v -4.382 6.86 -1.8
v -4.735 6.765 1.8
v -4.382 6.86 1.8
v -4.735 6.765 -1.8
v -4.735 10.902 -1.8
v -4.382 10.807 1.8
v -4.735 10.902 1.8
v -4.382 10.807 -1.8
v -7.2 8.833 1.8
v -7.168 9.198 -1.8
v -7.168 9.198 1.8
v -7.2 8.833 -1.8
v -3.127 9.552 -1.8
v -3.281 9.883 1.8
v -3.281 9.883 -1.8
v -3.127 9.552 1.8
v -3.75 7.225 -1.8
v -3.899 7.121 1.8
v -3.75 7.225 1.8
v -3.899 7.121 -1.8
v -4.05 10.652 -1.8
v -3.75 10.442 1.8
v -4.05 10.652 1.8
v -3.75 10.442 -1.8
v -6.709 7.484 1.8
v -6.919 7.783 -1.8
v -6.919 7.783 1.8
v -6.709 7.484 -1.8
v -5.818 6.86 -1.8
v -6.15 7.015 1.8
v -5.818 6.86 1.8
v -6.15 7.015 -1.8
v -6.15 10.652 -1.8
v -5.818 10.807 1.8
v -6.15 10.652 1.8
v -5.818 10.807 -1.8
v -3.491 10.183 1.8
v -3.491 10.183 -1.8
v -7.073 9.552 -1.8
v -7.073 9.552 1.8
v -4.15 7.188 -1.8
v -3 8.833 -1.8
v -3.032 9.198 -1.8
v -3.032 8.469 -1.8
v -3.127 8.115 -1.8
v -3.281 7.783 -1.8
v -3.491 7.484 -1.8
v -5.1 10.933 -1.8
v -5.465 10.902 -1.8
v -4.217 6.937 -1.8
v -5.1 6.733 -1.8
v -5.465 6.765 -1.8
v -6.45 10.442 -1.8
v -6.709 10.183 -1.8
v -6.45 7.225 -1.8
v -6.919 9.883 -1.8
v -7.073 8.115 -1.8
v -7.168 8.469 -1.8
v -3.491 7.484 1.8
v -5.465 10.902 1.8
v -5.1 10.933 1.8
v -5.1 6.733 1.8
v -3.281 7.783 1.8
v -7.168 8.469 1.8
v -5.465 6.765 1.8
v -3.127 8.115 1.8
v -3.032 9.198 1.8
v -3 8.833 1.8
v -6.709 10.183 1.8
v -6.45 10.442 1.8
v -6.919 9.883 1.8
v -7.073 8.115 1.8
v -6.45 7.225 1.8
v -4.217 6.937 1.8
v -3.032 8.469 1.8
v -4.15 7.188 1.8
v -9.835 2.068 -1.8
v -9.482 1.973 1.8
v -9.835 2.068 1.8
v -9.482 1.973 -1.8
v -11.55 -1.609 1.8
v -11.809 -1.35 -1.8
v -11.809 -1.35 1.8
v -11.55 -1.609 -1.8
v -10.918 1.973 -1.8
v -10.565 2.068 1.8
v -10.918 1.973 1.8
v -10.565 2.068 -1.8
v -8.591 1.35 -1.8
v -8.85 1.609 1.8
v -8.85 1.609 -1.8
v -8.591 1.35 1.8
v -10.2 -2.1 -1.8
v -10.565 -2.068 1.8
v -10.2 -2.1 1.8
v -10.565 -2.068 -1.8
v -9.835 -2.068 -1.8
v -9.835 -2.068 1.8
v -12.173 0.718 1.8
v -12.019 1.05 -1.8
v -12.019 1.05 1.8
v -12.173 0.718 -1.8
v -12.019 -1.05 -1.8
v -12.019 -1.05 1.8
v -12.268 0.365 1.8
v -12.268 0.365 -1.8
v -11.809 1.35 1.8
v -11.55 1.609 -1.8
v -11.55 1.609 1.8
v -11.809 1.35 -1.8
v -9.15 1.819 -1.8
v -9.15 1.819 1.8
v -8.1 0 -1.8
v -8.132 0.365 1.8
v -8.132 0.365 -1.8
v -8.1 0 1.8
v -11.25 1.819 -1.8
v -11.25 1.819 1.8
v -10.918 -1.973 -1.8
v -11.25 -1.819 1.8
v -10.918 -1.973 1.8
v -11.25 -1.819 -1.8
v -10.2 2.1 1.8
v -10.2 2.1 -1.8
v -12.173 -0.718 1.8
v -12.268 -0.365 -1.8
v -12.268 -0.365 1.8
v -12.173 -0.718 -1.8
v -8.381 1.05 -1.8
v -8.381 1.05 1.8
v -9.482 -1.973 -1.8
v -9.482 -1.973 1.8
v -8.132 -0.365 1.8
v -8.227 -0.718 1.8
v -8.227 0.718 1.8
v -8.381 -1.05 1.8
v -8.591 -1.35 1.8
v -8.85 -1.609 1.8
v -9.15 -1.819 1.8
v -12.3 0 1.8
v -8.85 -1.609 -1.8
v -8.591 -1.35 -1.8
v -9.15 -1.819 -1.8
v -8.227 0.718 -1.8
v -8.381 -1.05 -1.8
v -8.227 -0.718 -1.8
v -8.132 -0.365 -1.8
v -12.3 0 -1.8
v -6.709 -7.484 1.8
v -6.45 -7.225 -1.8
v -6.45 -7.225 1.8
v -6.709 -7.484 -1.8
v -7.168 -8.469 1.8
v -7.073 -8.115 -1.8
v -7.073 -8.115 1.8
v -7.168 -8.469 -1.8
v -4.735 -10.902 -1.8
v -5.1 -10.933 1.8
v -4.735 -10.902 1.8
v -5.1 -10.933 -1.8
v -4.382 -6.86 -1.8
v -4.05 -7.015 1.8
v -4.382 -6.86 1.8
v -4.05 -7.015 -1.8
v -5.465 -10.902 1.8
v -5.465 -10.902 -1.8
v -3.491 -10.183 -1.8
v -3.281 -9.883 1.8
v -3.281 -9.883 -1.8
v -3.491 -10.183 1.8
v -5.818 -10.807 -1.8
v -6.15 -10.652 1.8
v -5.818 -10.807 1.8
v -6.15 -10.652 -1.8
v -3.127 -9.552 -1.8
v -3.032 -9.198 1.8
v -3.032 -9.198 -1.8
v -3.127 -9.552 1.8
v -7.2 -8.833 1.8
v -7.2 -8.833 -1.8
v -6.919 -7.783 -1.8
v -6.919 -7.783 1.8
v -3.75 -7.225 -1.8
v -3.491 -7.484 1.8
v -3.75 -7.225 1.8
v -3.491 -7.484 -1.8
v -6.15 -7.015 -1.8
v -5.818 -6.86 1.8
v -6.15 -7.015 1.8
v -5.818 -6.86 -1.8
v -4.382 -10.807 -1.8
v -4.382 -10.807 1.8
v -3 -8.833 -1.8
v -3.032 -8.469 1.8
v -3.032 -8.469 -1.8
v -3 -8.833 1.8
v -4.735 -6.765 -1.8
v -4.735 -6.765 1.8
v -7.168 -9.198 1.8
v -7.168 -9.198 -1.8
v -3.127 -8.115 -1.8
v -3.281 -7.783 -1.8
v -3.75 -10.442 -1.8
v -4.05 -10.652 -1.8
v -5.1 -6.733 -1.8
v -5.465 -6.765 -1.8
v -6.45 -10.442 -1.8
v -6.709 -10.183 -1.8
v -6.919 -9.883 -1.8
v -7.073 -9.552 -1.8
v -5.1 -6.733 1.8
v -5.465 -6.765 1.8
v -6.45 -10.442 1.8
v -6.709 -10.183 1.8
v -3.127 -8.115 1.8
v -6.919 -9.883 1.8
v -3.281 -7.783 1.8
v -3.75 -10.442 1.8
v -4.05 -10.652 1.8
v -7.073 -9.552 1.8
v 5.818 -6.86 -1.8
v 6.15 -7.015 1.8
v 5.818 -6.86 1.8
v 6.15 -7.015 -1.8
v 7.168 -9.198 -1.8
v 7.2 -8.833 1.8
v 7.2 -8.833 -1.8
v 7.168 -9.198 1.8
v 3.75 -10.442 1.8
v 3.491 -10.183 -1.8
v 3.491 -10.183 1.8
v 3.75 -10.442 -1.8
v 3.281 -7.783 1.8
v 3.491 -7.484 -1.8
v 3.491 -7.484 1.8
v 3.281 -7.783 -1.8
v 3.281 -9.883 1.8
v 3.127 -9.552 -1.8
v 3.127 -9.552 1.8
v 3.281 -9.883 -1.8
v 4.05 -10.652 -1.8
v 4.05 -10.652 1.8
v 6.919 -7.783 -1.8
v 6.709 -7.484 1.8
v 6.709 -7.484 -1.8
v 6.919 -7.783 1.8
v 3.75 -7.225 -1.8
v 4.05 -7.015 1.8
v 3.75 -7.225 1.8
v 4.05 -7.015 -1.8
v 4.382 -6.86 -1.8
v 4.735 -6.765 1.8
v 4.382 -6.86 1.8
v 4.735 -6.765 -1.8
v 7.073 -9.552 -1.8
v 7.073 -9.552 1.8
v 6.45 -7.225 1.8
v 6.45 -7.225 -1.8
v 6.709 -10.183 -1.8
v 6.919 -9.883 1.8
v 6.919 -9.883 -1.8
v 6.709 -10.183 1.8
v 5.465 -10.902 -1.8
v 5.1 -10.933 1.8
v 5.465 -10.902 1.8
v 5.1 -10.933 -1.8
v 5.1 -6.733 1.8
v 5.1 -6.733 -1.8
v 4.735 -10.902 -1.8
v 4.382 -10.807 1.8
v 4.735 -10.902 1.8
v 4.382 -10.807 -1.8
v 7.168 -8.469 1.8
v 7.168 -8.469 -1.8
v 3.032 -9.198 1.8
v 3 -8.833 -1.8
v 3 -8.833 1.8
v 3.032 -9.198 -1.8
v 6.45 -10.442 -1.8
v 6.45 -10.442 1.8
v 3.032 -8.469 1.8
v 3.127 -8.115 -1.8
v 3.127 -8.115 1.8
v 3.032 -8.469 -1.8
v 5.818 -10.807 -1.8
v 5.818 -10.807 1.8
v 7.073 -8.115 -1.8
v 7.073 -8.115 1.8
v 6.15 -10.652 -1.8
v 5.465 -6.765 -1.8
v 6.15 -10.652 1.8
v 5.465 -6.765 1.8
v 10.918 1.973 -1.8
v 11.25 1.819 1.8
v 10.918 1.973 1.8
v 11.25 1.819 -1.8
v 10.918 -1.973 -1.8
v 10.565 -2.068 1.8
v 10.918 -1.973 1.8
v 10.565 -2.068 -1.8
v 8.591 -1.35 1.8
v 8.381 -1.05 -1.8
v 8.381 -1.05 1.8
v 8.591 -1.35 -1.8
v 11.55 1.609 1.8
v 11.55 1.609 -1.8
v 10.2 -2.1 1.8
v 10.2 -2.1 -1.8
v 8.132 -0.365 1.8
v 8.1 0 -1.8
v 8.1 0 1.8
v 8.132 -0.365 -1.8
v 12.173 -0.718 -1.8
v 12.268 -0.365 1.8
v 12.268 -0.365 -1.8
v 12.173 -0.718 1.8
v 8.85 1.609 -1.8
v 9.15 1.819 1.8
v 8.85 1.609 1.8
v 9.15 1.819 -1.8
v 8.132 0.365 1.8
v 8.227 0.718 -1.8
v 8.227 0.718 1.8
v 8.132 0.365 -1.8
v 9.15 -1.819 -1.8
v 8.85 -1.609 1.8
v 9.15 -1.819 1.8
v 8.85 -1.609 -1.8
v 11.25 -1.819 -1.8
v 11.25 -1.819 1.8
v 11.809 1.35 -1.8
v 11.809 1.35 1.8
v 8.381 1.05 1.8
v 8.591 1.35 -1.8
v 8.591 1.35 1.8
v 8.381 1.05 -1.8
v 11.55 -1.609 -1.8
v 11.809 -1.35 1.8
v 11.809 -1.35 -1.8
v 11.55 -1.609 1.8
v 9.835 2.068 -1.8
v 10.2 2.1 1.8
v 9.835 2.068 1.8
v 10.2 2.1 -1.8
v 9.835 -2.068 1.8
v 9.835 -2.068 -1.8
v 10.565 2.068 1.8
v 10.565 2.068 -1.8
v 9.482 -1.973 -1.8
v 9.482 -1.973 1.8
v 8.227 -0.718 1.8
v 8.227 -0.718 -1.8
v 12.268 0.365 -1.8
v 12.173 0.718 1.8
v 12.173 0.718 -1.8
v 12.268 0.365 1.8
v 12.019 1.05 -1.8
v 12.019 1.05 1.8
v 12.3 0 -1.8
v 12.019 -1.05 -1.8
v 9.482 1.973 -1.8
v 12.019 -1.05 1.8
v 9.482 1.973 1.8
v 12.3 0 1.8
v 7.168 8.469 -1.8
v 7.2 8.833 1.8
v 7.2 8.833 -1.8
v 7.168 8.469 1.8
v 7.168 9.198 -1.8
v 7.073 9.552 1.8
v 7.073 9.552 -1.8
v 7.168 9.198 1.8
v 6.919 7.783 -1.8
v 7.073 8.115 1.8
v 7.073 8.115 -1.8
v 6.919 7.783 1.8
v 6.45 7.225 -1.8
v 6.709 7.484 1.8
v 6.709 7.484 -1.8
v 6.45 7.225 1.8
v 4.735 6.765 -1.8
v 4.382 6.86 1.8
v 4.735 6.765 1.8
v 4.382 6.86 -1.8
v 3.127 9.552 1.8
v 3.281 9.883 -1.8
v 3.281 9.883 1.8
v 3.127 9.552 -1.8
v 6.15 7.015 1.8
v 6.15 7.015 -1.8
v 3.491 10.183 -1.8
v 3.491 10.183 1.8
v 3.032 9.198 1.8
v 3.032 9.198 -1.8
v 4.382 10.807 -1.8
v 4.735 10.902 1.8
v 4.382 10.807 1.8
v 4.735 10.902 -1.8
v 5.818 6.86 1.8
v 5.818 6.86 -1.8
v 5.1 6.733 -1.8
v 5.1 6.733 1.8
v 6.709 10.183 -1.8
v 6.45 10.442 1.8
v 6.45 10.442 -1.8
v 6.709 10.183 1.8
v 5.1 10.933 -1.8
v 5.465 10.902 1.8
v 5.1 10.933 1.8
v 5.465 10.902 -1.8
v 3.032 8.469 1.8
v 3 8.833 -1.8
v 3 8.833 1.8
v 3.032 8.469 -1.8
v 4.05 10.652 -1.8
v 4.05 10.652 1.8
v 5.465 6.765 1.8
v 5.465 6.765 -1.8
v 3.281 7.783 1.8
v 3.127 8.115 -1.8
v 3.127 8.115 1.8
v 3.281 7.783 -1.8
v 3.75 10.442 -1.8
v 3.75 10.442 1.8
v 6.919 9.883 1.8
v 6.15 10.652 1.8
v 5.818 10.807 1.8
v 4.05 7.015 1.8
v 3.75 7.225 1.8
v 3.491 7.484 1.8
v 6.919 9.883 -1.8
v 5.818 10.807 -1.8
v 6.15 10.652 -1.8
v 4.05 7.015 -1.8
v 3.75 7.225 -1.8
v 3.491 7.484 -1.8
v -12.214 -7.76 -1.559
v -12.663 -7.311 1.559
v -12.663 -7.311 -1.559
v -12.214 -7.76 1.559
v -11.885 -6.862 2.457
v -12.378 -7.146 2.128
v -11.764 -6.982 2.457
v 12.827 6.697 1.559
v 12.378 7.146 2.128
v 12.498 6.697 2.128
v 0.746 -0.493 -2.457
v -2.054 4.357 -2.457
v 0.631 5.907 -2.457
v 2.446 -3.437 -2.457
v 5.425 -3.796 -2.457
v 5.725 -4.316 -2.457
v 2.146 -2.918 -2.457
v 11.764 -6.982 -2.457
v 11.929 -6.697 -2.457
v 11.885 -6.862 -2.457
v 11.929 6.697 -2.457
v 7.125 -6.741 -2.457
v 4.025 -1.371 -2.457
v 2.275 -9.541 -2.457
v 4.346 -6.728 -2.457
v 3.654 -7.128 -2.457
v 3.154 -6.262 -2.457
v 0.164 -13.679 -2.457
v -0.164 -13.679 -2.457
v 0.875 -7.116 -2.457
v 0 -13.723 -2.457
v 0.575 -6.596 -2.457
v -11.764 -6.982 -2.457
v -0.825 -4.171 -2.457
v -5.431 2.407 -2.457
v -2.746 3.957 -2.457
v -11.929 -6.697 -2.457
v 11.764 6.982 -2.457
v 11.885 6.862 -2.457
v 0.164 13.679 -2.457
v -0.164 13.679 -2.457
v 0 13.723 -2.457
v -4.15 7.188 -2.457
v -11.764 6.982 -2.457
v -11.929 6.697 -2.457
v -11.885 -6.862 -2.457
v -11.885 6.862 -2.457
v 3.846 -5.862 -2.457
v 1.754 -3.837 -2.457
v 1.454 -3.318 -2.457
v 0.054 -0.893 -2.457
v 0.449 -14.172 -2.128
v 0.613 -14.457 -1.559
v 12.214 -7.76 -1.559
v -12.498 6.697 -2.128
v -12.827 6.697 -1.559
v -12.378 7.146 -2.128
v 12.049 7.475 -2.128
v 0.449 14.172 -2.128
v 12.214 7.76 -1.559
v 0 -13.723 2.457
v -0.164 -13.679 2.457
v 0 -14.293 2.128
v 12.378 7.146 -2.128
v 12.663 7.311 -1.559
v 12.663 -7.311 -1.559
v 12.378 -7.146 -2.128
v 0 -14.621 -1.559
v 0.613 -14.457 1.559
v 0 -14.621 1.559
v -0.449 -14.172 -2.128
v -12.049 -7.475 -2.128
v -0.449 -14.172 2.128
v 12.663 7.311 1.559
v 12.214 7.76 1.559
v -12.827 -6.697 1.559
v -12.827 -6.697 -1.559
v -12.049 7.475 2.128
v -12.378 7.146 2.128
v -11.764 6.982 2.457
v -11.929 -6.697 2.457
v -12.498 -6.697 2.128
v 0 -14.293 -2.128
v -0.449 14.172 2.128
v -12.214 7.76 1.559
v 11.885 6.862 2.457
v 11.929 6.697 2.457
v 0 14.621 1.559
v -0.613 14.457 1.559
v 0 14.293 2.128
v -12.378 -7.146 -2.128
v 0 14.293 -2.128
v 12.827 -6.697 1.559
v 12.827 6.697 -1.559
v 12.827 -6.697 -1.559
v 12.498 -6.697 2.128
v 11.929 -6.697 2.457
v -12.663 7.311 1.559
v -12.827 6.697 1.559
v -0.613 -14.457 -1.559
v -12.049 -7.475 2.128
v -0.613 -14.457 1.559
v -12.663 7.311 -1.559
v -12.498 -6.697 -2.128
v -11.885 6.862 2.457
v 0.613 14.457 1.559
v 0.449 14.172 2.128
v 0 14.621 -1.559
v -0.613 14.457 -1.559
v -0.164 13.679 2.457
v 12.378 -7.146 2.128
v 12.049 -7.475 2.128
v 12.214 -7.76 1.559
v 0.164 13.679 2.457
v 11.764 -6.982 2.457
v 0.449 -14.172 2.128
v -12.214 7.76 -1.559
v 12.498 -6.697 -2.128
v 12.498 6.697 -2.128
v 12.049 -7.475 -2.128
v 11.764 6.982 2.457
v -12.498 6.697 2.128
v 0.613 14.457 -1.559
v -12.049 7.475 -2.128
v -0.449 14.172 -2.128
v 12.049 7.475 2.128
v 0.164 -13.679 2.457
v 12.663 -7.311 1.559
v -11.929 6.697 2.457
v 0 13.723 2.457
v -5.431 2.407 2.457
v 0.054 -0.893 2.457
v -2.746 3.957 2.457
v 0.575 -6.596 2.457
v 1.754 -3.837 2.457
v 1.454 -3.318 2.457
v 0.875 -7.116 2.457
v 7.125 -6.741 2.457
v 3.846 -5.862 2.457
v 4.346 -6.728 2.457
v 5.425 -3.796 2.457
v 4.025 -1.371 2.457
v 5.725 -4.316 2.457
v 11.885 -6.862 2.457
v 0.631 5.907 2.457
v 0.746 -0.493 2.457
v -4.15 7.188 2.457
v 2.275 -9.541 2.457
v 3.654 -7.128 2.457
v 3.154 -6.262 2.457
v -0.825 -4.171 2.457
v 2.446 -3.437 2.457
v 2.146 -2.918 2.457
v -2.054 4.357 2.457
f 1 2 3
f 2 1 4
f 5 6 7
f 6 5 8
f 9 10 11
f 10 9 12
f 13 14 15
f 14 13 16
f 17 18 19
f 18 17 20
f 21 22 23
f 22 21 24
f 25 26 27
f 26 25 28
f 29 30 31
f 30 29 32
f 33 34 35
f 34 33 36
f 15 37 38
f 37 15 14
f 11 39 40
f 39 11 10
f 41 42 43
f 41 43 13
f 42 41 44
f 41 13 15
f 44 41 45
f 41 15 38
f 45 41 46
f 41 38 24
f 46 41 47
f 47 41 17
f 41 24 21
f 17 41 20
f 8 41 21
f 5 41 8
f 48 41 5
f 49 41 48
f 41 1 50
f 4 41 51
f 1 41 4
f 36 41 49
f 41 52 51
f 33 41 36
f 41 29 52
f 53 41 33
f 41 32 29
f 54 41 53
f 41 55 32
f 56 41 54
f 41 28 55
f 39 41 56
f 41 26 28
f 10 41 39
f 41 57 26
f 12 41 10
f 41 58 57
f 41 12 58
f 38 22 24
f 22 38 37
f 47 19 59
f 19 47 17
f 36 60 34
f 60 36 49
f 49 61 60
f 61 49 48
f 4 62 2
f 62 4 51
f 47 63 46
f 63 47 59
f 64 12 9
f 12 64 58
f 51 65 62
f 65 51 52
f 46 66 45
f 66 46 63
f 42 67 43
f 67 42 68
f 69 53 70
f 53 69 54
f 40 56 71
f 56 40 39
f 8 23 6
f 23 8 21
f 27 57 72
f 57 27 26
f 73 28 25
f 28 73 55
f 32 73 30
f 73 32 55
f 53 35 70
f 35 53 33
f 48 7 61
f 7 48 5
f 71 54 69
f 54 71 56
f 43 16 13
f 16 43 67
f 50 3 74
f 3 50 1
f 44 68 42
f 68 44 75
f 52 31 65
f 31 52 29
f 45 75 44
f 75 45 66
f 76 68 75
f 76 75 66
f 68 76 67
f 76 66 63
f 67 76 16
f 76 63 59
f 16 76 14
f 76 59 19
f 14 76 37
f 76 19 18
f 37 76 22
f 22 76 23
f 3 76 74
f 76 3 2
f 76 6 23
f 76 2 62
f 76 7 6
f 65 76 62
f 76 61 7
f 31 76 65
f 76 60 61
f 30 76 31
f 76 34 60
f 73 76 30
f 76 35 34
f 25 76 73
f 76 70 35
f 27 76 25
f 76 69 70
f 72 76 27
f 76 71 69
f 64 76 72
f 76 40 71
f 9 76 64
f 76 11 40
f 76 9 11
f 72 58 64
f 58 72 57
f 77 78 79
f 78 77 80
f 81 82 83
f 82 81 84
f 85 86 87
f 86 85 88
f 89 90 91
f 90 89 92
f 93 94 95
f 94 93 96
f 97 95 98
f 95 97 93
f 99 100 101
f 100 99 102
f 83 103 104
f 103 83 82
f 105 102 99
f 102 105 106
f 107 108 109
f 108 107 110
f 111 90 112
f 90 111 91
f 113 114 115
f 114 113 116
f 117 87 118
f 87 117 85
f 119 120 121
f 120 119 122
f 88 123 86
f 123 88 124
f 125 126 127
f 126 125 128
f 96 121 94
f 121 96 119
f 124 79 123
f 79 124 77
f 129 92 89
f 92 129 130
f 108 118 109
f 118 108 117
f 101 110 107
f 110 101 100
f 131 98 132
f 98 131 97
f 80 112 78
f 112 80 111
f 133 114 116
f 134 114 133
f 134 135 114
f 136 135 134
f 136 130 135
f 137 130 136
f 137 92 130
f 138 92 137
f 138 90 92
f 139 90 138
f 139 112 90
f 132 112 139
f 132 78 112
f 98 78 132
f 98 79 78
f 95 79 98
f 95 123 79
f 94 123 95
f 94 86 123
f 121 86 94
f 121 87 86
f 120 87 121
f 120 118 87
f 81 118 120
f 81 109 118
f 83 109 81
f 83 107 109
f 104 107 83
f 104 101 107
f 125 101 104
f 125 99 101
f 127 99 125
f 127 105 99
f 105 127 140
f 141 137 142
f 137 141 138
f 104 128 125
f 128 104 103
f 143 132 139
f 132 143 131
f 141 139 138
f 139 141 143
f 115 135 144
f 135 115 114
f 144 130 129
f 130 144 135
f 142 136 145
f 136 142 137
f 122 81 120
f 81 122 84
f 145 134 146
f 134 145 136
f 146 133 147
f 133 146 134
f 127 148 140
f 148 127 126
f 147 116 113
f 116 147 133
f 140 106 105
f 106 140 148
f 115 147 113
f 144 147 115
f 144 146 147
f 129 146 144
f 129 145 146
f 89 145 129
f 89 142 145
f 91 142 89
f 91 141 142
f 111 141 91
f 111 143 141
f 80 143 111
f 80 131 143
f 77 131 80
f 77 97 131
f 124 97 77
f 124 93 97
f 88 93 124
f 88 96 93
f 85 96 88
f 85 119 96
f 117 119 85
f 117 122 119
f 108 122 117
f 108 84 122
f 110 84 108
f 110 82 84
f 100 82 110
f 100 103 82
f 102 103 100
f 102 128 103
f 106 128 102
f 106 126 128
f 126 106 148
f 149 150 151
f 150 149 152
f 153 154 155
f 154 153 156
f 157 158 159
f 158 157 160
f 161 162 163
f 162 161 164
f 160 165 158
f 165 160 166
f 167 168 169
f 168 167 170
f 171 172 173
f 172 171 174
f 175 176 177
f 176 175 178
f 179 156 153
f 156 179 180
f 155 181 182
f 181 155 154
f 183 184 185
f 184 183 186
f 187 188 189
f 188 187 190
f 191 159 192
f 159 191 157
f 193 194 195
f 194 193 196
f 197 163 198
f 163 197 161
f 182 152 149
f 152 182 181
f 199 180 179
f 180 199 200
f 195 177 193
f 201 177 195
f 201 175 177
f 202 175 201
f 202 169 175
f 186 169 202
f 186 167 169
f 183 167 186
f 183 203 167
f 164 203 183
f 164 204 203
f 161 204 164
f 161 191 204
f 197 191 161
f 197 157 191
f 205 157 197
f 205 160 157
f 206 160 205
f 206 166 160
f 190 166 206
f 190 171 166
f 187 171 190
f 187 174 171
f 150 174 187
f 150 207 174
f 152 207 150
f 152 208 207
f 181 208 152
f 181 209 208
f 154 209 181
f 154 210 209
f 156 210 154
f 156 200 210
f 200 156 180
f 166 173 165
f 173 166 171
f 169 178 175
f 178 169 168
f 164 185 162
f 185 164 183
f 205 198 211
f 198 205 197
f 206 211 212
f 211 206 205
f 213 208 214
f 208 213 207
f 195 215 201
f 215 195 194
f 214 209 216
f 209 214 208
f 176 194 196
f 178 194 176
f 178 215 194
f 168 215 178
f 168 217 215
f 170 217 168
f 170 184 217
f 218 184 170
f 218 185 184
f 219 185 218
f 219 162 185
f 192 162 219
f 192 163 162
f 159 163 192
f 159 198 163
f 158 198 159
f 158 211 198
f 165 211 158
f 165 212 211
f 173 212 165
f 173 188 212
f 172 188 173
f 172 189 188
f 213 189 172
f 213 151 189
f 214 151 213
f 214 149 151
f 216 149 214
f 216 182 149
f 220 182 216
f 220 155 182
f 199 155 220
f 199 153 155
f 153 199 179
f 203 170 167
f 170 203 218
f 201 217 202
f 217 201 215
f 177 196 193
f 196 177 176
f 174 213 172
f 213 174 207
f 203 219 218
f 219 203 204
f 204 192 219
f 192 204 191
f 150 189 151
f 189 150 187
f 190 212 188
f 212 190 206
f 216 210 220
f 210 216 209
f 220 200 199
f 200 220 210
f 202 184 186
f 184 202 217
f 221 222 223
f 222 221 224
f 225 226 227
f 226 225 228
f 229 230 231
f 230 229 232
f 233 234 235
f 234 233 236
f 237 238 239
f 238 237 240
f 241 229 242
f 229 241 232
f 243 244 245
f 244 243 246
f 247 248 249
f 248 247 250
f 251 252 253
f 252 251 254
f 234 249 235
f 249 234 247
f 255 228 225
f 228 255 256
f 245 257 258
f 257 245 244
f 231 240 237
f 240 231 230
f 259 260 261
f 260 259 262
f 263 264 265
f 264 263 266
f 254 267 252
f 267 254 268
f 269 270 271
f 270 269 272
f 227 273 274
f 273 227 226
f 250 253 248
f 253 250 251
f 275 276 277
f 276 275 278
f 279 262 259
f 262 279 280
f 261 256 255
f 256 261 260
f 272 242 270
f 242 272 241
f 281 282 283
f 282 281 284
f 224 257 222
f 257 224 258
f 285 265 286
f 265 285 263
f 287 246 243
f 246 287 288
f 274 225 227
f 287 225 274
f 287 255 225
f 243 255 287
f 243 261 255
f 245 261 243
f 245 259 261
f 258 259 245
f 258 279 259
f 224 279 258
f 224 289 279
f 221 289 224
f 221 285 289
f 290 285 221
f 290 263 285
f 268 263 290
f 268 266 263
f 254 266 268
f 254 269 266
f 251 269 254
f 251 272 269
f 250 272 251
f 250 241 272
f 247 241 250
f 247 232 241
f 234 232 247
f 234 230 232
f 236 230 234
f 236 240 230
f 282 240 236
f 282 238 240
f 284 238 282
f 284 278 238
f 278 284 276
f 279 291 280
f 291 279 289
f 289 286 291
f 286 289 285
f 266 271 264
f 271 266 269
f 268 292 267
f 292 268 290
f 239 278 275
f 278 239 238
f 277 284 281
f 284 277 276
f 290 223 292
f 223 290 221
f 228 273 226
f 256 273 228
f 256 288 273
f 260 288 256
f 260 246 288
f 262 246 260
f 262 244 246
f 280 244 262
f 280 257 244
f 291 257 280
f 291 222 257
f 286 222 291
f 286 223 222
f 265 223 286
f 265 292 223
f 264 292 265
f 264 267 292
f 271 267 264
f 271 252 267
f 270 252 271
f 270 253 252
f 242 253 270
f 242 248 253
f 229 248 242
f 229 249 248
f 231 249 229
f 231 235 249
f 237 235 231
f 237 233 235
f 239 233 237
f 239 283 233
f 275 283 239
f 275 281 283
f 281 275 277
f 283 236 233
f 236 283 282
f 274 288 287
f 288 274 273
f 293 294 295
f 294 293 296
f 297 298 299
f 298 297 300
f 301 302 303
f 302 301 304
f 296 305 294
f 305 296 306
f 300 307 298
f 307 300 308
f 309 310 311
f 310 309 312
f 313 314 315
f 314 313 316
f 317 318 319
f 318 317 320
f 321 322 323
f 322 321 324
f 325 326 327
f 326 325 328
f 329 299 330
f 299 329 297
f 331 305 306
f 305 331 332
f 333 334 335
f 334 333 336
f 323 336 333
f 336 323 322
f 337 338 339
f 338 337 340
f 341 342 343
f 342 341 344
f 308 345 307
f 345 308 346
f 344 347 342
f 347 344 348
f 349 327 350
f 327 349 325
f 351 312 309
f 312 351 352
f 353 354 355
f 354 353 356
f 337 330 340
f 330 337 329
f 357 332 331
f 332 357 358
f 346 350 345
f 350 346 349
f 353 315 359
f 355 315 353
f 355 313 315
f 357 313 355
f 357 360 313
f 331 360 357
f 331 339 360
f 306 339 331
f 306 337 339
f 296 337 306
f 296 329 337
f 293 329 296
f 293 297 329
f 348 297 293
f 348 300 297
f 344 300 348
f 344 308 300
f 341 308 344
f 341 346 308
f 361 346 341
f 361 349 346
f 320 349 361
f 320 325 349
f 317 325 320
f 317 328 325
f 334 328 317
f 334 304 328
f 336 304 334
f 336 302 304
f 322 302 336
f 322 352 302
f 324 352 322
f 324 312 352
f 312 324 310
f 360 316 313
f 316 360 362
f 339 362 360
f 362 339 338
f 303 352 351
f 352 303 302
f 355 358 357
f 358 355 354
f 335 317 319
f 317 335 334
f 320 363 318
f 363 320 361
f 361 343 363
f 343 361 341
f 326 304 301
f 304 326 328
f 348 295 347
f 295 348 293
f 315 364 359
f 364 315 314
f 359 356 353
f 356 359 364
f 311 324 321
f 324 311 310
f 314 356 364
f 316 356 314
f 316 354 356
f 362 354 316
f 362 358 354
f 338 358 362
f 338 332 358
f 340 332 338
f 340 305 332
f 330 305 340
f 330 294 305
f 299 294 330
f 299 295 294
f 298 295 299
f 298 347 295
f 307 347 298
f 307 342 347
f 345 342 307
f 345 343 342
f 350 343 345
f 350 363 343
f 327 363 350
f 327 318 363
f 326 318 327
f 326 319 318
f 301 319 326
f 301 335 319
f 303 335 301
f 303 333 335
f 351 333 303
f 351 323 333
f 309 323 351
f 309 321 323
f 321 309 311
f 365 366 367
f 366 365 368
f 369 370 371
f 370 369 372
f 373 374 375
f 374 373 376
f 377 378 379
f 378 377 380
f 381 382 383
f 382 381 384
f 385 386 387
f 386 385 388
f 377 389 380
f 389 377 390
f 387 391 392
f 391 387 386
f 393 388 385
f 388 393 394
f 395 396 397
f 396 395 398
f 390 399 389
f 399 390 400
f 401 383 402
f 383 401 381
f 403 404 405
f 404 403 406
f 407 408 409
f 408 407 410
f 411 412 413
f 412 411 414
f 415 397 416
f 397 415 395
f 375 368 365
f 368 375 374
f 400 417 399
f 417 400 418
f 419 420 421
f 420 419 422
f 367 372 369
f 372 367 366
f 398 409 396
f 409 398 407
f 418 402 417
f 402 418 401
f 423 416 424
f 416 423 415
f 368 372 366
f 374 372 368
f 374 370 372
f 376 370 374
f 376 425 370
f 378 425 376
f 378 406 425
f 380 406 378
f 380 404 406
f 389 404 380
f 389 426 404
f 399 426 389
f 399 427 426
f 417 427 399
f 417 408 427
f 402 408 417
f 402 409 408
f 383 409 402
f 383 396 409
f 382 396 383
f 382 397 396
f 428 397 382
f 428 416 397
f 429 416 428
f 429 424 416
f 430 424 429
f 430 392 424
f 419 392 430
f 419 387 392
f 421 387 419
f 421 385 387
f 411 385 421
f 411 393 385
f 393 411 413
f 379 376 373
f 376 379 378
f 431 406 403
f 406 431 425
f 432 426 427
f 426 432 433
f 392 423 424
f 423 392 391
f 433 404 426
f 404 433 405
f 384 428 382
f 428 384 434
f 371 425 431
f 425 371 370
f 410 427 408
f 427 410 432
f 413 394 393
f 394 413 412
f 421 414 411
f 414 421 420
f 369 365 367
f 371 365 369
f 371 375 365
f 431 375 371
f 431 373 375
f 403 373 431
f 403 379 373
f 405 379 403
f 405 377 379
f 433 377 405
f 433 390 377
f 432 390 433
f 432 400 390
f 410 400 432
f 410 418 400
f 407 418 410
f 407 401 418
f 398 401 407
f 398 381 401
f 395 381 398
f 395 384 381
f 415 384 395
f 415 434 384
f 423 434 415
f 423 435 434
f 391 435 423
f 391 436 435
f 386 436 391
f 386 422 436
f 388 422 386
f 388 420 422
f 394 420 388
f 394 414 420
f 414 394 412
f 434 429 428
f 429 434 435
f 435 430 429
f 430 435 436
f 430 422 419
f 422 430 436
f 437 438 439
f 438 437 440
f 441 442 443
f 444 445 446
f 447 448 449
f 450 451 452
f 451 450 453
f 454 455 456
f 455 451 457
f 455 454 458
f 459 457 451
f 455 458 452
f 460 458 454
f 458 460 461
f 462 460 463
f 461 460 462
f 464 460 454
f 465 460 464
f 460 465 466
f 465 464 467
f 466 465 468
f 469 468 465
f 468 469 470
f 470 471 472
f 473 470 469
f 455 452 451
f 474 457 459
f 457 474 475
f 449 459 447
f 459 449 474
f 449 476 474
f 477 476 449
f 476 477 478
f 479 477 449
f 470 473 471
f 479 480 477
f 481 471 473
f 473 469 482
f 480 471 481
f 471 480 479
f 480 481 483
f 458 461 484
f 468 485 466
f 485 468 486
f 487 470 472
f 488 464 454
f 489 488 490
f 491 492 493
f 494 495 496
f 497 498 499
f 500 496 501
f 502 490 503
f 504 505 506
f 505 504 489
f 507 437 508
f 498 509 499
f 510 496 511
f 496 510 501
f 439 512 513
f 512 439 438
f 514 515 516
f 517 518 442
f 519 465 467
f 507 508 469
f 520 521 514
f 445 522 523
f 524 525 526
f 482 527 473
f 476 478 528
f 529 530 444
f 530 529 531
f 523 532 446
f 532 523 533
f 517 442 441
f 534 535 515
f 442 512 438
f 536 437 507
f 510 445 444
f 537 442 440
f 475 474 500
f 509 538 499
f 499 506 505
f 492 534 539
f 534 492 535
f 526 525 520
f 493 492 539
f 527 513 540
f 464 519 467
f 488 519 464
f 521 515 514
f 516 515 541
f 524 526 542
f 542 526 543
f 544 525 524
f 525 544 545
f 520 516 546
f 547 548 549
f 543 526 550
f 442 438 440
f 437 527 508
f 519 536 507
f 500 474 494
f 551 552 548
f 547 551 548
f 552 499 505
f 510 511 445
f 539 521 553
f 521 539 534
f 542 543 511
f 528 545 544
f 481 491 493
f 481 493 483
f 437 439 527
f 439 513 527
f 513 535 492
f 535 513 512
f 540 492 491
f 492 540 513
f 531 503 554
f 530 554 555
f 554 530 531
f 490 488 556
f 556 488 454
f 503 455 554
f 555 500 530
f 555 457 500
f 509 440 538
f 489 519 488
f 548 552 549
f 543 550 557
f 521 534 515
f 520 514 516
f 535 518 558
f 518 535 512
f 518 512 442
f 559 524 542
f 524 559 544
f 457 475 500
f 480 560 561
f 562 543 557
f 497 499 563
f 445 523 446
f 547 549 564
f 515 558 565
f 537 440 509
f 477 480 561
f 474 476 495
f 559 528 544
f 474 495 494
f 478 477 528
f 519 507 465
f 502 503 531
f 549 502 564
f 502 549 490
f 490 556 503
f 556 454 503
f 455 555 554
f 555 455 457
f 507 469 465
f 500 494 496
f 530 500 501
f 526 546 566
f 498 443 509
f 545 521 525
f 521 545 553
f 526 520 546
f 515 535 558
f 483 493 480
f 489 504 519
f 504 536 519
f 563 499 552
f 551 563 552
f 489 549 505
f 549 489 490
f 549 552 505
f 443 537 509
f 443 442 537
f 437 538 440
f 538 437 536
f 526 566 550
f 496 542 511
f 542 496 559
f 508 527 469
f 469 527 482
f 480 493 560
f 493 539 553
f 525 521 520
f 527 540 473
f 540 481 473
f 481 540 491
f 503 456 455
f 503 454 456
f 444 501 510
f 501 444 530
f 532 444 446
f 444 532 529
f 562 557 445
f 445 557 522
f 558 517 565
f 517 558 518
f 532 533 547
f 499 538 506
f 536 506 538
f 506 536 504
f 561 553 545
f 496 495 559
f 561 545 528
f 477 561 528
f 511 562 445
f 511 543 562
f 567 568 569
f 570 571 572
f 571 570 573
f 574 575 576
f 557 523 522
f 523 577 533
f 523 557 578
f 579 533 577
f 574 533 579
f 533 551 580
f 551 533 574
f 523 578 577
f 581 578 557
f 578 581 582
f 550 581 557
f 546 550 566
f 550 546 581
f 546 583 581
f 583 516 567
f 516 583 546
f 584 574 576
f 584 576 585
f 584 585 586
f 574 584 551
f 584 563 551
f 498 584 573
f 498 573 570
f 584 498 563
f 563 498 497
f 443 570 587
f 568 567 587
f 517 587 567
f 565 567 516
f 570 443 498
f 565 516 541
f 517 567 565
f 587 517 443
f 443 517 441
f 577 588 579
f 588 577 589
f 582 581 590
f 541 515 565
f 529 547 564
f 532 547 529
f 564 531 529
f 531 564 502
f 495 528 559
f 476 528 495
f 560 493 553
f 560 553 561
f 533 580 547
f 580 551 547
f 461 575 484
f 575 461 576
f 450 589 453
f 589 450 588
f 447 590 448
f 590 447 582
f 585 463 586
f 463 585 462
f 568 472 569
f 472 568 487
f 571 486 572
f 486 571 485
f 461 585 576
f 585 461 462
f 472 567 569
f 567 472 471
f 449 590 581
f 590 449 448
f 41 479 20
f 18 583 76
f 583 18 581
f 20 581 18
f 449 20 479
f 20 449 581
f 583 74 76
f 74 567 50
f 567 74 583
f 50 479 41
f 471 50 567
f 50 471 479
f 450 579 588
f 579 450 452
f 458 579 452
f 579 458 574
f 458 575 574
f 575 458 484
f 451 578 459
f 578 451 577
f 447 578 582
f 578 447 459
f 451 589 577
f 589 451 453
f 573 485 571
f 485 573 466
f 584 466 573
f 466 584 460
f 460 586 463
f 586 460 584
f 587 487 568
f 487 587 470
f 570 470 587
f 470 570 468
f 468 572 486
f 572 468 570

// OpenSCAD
//
// chexes.scad
//

// unit is mm

inch = 25.4;
h = 5; // height unit, 5mm
o2 = 0.2;
//br = 3 / 2; // ball radius
br = 1.7;

r = inch / 2;
t = r / cos(30);
rr = r / 10;

//echo(inch, r, t);
//echo("bh", br + 2 * o2);
//echo("br + 2 * o2", 5 + 2 * o2);

module sphe() { sphere(r=rr, $fn=12); }

module balcyl() {

  hf = 2;
  h = br * hf + o2;

  dz = hf > 2 ? -3 * o2 : 0;

  translate([ 0, 0, dz ])
    cylinder(r=br + 2 * o2, h=h, center=true, $fn=36);
}

module hex(center_ball) {

  difference() {

    //%translate([ 0, 0, h * -0.5 ])
    translate([ 0, 0, h * -0.5 ])
      hull()
        for (a = [ 0 : 60 : 300 ]) {
          rotate([ 0, 0, a ]) {
            translate([ 0, t - rr, h - rr ]) sphe();
            translate([ 0, t - rr, rr ]) sphe();
          }
        }

    union() {

      if (center_ball) {
        balcyl();
      }

      for (a = [ 30 : 60 : 330 ]) {
        //echo(a);
        rotate([ 0, 0, a ]) translate([ 0, r - br - 4 * o2, 0 ]) balcyl();
      }
    }
  }
}


module charhex() {

  //a=0;x=-3;y=-7;z=1.9;c=true;symbol="\u2665",size=16;//heart
  //a=0;x=-7;y=-7;z=1.9;c=true;symbol="\u25BC";size=16;//headdowntriangle
  //a=0;x=-7;y=-7;z=1.9;c=true;symbol="\u2192";size=16;//arrowright
  //a=0;x=-7;y=-7;z=1.9;c=true;symbol="\u2660";size=16;//spade
  //a=0;x=-7;y=-7;z=1.9;c=true;symbol="\u2663";size=16;//club
  //a=0;x=-7;y=-7;z=1.9;c=true;symbol="\u2666";size=16;//diamond
  //a=0;x=-8.5;y=-9;z=-4;c=false;symbol="\u2191";size=24;//arrow
  a=0;x=-11.4;y=-6.0;z=-4;c=false;symbol="\u263c";size=18;//sun

  difference() {
    rotate([ 0, 0, a ]) hex(c);
    translate([ x, y, z ]) linear_extrude(7) text(symbol, size=size);
    translate([ 0, 0, 0 ]) cylinder(r=4.4, h=20, center=true, $fn=60); // for sun
  }
}
//charhex();


module lens() {
  module halflens() {
    difference() {
      circle(r=5.2, $fn=36);
      translate([ 6, 0, 0 ]) square(20, center=true);
    }
  }
  translate([ 4, 0, 0 ]) halflens();
  rotate([ 0, 0, 180 ]) translate([ 4, 0, 0 ]) halflens();
}

module lenspair() {
  union() {
    translate([ -1.4, 0, 0 ]) rotate([ 0, 0, 30 ]) linear_extrude(10) lens();
    translate([  1.4, 0, 0 ]) rotate([ 0, 0, -30 ]) linear_extrude(10) lens();
  }
}

module wheathex() {

  difference() {

    hex();

    translate([ 0, inch *  0.3, -5 ]) linear_extrude(10) lens();
    translate([ 0, inch *  0.1, -5 ]) lenspair();
    translate([ 0, inch * -0.1, -5 ]) lenspair();
    translate([ 0, inch * -0.3, -5 ]) lenspair();
  }
}
//wheathex();


module arrow() {
  diameter = 20;
  slit_width = 0.8;
  arrow_base = 7;
  ab_2 = arrow_base / 2;
  diameter_2 = diameter / 2;
  fs = 0.4 * arrow_base; // feather side
  fs2 = 2 * fs;
  h = 10;
  union() {

    translate([ 0, 0, 0 ])
      cube([ slit_width, 0.7 * diameter, h ], center=true);

    translate([ 0, diameter_2 - 1.2 * ab_2, -0.5 * h ])
      linear_extrude(h)
        polygon([
          [ -ab_2, 0 ], [ 0, ab_2 ], [ ab_2, 0 ] ]);

    translate([ 0, -0.84 * diameter_2, -0.5 * h ])
      linear_extrude(h)
        polygon([ [ 0, fs ], [ 0, fs2 ], [ fs, fs ], [ fs, 0 ] ]);
    translate([ 0, -0.5 * diameter_2, -0.5 * h ])
      linear_extrude(h)
        polygon([ [ 0, fs ], [ 0, fs2 ], [ fs, fs ], [ fs, 0 ] ]);

    translate([ 0, -0.84 * diameter_2, -0.5 * h ])
      linear_extrude(h)
        polygon([ [ 0, fs ], [ 0, fs2 ], [ -fs, fs ], [ -fs, 0 ] ]);
    translate([ 0, -0.5 * diameter_2, -0.5 * h ])
      linear_extrude(h)
        polygon([ [ 0, fs ], [ 0, fs2 ], [ -fs, fs ], [ -fs, 0 ] ]);
  }
}
module pointerhex() {
  difference() {
    hex();
    rotate([ 0, 0, 30 ]) translate([ 0, -1, 0 ]) arrow();
  }
}
pointerhex();
